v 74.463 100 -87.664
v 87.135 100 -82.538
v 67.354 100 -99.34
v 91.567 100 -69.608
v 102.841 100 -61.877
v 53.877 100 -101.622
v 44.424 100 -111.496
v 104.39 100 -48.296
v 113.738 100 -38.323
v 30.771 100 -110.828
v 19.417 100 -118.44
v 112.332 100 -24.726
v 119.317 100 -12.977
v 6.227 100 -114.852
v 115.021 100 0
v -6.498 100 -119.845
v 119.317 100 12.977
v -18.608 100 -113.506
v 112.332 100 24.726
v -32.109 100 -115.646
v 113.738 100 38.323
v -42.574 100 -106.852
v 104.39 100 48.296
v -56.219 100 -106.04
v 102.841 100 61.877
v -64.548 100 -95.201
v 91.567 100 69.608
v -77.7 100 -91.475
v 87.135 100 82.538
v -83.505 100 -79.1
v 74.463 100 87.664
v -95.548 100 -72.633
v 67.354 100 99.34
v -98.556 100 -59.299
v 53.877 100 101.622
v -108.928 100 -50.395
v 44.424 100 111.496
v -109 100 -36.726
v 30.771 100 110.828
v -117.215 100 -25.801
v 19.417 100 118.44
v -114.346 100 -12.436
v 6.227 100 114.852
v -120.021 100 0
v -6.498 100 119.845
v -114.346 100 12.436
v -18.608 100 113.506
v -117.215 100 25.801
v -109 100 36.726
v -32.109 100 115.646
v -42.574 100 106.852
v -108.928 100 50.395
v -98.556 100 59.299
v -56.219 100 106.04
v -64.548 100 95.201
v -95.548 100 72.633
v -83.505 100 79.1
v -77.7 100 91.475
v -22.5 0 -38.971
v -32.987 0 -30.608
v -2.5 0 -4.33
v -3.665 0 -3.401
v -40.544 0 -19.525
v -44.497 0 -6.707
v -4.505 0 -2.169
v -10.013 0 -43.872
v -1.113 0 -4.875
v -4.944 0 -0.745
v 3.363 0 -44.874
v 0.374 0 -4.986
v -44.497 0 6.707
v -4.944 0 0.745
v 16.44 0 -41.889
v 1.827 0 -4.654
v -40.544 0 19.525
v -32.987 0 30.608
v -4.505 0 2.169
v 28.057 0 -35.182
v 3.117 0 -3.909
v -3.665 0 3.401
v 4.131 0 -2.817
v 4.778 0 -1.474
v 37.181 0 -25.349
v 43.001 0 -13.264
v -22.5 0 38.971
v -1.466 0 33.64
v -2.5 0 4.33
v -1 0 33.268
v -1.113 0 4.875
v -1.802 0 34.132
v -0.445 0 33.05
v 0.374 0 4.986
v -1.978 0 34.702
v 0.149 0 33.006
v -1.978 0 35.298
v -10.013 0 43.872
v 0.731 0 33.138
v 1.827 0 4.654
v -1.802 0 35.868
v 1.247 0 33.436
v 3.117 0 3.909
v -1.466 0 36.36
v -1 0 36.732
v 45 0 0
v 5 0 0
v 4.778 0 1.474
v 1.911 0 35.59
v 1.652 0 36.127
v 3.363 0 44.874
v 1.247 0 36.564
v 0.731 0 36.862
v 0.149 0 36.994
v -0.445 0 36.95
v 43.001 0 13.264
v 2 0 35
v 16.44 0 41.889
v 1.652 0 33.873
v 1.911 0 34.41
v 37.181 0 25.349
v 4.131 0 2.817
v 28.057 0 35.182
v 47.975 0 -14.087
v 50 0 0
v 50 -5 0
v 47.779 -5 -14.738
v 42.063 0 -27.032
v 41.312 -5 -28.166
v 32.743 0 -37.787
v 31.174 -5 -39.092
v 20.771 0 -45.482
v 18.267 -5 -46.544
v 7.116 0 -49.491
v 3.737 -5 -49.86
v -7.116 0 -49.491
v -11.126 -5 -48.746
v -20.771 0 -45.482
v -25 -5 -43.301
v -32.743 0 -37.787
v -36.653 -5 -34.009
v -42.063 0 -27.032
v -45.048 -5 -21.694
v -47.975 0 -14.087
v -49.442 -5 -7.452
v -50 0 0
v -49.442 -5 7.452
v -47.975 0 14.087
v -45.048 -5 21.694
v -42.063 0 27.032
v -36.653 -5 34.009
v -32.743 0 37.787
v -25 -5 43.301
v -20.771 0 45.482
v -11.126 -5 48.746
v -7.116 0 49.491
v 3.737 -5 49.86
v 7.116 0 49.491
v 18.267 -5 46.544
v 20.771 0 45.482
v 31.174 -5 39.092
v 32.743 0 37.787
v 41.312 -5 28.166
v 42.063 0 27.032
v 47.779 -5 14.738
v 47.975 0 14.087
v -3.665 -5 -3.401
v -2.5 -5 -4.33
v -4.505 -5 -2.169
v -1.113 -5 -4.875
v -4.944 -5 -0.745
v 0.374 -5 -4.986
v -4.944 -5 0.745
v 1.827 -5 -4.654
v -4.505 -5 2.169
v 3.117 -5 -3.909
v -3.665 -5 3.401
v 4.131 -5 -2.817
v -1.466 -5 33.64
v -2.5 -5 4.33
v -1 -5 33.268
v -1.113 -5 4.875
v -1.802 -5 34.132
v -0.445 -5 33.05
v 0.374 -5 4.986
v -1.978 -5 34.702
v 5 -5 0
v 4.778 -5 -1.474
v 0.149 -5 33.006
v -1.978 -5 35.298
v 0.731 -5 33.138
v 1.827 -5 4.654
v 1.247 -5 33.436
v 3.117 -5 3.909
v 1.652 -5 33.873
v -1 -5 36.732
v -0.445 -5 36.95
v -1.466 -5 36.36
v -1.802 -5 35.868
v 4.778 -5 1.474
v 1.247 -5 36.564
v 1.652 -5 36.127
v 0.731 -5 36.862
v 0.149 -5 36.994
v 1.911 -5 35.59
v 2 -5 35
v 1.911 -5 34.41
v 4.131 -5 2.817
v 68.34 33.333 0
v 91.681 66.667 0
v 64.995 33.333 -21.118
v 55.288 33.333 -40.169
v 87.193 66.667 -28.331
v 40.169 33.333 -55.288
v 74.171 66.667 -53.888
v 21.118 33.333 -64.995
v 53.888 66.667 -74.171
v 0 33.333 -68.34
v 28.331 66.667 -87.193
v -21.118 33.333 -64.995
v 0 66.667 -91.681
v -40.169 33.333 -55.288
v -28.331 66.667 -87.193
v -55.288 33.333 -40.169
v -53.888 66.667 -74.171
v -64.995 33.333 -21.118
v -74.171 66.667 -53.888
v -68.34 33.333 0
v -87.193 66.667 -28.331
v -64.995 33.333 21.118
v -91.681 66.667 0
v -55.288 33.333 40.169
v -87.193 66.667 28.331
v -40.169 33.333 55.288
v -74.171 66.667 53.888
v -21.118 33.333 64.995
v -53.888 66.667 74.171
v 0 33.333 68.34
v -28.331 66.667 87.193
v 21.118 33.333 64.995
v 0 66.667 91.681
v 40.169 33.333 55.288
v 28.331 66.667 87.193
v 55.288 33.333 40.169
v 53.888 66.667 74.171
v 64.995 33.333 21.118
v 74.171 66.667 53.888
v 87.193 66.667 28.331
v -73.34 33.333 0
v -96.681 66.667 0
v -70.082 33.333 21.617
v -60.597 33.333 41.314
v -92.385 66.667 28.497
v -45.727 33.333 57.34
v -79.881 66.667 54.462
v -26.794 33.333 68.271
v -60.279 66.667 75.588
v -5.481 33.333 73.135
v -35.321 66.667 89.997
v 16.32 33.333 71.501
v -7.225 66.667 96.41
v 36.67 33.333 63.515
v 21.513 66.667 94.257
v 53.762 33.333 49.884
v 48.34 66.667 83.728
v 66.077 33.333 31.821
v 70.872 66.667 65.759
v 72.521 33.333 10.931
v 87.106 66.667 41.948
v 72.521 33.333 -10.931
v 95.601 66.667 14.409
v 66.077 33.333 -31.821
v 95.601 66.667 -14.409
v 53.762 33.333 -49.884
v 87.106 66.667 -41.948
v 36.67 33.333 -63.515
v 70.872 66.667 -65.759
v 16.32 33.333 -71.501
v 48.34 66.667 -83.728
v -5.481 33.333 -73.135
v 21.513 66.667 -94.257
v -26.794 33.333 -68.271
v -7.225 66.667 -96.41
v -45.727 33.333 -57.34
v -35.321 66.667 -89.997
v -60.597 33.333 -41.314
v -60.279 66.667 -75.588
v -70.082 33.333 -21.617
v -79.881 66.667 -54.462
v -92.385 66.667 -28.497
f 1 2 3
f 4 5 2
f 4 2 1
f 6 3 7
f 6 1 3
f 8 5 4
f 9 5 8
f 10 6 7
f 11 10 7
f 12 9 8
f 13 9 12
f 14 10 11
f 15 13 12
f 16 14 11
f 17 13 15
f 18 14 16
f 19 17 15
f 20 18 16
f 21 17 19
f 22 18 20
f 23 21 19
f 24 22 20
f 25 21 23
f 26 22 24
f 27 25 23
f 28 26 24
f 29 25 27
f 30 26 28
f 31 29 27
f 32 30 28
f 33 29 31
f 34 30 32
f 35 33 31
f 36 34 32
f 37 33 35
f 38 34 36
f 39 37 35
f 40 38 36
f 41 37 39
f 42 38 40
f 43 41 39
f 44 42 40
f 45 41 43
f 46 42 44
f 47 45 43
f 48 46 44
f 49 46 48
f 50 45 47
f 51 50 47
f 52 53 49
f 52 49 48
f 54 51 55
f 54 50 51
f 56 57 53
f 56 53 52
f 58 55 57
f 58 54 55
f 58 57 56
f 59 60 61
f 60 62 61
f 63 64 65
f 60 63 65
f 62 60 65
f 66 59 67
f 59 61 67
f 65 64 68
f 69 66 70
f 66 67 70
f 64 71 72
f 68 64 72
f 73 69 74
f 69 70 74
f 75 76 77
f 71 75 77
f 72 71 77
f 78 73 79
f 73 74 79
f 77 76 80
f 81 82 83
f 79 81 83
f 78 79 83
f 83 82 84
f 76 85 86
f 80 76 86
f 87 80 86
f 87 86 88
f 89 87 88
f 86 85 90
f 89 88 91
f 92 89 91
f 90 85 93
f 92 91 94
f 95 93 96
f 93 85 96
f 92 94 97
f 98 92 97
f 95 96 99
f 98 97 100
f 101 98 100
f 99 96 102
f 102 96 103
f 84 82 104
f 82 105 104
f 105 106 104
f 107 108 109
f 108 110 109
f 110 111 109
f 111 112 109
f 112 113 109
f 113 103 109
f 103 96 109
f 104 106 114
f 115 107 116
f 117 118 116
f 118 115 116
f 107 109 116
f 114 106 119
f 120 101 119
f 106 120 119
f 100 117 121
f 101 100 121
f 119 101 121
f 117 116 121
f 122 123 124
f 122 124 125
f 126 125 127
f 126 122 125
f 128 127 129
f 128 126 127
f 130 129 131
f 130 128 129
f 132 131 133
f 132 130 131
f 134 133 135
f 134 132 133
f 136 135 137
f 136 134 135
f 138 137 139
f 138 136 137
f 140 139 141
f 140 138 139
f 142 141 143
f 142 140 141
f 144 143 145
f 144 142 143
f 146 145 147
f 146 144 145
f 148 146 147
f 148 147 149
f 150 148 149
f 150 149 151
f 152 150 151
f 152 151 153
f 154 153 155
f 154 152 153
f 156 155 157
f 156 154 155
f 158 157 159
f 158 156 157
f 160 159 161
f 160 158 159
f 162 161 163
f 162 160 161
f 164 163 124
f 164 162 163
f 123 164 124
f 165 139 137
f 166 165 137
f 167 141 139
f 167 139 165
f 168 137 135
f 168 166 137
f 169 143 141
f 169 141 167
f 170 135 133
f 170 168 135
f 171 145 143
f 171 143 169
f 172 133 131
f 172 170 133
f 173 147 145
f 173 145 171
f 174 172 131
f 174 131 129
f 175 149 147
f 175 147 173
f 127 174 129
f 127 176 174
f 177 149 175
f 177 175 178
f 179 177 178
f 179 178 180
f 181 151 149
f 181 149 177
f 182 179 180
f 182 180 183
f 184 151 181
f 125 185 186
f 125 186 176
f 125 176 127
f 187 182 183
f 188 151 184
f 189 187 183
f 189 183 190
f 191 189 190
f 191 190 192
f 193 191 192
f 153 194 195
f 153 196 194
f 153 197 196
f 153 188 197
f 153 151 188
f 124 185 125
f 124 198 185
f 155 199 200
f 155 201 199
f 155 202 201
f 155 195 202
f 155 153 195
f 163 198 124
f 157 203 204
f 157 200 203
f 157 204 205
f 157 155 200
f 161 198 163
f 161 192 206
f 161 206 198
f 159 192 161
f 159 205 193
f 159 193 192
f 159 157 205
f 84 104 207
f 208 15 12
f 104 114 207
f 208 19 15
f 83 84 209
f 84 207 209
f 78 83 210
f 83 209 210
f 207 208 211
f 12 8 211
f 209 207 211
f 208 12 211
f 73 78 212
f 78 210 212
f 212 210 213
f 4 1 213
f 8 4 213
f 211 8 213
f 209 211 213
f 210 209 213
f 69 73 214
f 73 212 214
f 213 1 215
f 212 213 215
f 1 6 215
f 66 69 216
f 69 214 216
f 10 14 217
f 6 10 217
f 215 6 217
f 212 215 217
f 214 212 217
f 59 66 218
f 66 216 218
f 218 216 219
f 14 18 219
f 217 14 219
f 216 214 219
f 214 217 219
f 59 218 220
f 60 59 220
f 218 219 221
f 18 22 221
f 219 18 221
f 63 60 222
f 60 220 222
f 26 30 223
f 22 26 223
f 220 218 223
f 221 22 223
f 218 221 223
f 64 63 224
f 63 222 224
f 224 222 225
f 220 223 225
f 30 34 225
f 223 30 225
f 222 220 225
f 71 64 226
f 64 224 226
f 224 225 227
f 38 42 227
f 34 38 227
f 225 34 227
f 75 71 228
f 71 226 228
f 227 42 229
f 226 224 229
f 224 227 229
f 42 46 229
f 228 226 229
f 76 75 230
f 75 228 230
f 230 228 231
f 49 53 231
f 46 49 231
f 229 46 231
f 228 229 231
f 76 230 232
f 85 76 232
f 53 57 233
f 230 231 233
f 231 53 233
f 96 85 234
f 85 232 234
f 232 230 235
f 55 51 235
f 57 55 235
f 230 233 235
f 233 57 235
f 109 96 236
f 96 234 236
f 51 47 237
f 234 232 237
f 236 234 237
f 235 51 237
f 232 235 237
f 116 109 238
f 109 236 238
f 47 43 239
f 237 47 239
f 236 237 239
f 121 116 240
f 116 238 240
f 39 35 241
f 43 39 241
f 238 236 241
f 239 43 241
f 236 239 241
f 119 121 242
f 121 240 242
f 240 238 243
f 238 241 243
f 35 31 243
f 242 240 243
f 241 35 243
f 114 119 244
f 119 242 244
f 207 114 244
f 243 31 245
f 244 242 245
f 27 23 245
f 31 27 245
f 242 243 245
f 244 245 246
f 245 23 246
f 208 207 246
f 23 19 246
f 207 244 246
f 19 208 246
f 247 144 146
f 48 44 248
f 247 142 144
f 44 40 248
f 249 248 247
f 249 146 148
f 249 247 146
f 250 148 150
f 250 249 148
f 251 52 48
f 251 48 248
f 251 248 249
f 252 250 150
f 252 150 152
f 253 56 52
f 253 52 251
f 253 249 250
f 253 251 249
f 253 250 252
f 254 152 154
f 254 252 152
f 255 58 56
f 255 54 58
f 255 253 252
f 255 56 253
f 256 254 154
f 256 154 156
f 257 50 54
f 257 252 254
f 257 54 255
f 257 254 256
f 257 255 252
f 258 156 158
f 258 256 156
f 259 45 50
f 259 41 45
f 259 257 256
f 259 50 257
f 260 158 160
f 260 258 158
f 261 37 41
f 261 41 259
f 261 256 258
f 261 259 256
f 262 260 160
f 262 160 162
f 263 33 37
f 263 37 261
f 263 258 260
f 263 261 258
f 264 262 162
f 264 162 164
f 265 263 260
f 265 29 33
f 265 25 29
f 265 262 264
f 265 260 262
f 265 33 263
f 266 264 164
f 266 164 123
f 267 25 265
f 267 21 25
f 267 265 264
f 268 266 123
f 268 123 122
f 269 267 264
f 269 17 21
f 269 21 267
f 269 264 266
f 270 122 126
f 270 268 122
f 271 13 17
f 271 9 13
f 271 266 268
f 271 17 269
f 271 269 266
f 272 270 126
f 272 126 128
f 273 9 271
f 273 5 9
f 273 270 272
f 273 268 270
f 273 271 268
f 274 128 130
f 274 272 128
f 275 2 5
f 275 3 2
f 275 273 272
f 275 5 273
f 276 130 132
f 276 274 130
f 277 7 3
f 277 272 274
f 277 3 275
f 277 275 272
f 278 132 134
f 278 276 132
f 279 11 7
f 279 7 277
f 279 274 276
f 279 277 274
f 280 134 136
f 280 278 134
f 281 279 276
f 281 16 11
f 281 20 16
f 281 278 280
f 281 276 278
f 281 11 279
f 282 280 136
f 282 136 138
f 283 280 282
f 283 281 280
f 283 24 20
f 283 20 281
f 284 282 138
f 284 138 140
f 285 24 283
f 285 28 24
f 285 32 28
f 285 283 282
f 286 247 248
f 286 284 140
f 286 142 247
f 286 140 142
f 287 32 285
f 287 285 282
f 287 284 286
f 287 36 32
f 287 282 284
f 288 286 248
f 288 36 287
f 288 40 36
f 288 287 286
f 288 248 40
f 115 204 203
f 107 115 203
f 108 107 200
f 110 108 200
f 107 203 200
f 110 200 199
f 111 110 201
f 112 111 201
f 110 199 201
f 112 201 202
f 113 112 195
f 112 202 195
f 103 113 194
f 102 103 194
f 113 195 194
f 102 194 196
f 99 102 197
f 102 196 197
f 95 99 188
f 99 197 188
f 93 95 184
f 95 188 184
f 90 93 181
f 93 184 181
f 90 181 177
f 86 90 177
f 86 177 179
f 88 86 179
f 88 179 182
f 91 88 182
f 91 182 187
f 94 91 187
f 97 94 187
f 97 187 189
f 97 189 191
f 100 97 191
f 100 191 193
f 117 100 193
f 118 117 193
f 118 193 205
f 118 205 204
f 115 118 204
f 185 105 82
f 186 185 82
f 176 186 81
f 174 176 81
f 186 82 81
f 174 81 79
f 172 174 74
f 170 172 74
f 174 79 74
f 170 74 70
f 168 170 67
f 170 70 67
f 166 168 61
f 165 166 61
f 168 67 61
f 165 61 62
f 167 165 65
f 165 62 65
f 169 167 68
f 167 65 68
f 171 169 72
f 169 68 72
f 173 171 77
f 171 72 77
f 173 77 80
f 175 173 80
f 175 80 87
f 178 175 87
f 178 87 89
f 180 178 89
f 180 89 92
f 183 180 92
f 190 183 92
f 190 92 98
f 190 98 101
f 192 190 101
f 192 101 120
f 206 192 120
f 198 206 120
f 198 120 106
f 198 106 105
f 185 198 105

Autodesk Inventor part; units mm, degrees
ref_plane "YZ Plane" through (0, 0, 0) normal (1, 0, 0) x (0, 1, 0)
ref_plane "XZ Plane" through (0, 0, 0) normal (0, 1, 0) x (-1, 0, 0)
ref_plane "XY Plane" through (0, 0, 0) normal (0, 0, 1) x (1, 0, 0)
sketch "Szkic6" plane through (0, 0, 0) normal (0, 1, 0) x (-1, 0, 0)
  circle A0 centre (0, 0) radius 50
  dimension "d28" = 100
extrude "Wyciągnięcie proste5" add sketch "Szkic6" along normal blind 100 draft 35
sketch "Szkic7" plane through (0, 0, 0) normal (0, -1, 0) x (1, 0, 0)
  circle A0 centre (0, 0) radius 45
  dimension "d31" = 90
extrude "Wyciągnięcie proste6" cut sketch "Szkic7" against normal blind 100 draft 35
sketch "Szkic8" plane through (0, 0, 0) normal (0, -1, 0) x (1, 0, 0)
  circle A0 centre (0, 0) radius 50
extrude "Wyciągnięcie proste7" add sketch "Szkic8" along normal blind 5
sketch "Szkic9" plane through (0, -5, 0) normal (0, -1, 0) x (1, 0, 0)
  circle A0 centre (0, 35) radius 2
  point P0 (0, 0)
  dimension "d36" = 4
extrude "Wyciągnięcie proste8" cut sketch "Szkic9" against normal blind 5
sketch "Szkic10" plane through (0, 0, 0) normal (0, 1, 0) x (1, 0, 0)
  circle A0 centre (0, 0) radius 5
  dimension "d39" = 10
extrude "Wyciągnięcie proste9" cut sketch "Szkic10" against normal blind 5
properties part number "Lejek"
